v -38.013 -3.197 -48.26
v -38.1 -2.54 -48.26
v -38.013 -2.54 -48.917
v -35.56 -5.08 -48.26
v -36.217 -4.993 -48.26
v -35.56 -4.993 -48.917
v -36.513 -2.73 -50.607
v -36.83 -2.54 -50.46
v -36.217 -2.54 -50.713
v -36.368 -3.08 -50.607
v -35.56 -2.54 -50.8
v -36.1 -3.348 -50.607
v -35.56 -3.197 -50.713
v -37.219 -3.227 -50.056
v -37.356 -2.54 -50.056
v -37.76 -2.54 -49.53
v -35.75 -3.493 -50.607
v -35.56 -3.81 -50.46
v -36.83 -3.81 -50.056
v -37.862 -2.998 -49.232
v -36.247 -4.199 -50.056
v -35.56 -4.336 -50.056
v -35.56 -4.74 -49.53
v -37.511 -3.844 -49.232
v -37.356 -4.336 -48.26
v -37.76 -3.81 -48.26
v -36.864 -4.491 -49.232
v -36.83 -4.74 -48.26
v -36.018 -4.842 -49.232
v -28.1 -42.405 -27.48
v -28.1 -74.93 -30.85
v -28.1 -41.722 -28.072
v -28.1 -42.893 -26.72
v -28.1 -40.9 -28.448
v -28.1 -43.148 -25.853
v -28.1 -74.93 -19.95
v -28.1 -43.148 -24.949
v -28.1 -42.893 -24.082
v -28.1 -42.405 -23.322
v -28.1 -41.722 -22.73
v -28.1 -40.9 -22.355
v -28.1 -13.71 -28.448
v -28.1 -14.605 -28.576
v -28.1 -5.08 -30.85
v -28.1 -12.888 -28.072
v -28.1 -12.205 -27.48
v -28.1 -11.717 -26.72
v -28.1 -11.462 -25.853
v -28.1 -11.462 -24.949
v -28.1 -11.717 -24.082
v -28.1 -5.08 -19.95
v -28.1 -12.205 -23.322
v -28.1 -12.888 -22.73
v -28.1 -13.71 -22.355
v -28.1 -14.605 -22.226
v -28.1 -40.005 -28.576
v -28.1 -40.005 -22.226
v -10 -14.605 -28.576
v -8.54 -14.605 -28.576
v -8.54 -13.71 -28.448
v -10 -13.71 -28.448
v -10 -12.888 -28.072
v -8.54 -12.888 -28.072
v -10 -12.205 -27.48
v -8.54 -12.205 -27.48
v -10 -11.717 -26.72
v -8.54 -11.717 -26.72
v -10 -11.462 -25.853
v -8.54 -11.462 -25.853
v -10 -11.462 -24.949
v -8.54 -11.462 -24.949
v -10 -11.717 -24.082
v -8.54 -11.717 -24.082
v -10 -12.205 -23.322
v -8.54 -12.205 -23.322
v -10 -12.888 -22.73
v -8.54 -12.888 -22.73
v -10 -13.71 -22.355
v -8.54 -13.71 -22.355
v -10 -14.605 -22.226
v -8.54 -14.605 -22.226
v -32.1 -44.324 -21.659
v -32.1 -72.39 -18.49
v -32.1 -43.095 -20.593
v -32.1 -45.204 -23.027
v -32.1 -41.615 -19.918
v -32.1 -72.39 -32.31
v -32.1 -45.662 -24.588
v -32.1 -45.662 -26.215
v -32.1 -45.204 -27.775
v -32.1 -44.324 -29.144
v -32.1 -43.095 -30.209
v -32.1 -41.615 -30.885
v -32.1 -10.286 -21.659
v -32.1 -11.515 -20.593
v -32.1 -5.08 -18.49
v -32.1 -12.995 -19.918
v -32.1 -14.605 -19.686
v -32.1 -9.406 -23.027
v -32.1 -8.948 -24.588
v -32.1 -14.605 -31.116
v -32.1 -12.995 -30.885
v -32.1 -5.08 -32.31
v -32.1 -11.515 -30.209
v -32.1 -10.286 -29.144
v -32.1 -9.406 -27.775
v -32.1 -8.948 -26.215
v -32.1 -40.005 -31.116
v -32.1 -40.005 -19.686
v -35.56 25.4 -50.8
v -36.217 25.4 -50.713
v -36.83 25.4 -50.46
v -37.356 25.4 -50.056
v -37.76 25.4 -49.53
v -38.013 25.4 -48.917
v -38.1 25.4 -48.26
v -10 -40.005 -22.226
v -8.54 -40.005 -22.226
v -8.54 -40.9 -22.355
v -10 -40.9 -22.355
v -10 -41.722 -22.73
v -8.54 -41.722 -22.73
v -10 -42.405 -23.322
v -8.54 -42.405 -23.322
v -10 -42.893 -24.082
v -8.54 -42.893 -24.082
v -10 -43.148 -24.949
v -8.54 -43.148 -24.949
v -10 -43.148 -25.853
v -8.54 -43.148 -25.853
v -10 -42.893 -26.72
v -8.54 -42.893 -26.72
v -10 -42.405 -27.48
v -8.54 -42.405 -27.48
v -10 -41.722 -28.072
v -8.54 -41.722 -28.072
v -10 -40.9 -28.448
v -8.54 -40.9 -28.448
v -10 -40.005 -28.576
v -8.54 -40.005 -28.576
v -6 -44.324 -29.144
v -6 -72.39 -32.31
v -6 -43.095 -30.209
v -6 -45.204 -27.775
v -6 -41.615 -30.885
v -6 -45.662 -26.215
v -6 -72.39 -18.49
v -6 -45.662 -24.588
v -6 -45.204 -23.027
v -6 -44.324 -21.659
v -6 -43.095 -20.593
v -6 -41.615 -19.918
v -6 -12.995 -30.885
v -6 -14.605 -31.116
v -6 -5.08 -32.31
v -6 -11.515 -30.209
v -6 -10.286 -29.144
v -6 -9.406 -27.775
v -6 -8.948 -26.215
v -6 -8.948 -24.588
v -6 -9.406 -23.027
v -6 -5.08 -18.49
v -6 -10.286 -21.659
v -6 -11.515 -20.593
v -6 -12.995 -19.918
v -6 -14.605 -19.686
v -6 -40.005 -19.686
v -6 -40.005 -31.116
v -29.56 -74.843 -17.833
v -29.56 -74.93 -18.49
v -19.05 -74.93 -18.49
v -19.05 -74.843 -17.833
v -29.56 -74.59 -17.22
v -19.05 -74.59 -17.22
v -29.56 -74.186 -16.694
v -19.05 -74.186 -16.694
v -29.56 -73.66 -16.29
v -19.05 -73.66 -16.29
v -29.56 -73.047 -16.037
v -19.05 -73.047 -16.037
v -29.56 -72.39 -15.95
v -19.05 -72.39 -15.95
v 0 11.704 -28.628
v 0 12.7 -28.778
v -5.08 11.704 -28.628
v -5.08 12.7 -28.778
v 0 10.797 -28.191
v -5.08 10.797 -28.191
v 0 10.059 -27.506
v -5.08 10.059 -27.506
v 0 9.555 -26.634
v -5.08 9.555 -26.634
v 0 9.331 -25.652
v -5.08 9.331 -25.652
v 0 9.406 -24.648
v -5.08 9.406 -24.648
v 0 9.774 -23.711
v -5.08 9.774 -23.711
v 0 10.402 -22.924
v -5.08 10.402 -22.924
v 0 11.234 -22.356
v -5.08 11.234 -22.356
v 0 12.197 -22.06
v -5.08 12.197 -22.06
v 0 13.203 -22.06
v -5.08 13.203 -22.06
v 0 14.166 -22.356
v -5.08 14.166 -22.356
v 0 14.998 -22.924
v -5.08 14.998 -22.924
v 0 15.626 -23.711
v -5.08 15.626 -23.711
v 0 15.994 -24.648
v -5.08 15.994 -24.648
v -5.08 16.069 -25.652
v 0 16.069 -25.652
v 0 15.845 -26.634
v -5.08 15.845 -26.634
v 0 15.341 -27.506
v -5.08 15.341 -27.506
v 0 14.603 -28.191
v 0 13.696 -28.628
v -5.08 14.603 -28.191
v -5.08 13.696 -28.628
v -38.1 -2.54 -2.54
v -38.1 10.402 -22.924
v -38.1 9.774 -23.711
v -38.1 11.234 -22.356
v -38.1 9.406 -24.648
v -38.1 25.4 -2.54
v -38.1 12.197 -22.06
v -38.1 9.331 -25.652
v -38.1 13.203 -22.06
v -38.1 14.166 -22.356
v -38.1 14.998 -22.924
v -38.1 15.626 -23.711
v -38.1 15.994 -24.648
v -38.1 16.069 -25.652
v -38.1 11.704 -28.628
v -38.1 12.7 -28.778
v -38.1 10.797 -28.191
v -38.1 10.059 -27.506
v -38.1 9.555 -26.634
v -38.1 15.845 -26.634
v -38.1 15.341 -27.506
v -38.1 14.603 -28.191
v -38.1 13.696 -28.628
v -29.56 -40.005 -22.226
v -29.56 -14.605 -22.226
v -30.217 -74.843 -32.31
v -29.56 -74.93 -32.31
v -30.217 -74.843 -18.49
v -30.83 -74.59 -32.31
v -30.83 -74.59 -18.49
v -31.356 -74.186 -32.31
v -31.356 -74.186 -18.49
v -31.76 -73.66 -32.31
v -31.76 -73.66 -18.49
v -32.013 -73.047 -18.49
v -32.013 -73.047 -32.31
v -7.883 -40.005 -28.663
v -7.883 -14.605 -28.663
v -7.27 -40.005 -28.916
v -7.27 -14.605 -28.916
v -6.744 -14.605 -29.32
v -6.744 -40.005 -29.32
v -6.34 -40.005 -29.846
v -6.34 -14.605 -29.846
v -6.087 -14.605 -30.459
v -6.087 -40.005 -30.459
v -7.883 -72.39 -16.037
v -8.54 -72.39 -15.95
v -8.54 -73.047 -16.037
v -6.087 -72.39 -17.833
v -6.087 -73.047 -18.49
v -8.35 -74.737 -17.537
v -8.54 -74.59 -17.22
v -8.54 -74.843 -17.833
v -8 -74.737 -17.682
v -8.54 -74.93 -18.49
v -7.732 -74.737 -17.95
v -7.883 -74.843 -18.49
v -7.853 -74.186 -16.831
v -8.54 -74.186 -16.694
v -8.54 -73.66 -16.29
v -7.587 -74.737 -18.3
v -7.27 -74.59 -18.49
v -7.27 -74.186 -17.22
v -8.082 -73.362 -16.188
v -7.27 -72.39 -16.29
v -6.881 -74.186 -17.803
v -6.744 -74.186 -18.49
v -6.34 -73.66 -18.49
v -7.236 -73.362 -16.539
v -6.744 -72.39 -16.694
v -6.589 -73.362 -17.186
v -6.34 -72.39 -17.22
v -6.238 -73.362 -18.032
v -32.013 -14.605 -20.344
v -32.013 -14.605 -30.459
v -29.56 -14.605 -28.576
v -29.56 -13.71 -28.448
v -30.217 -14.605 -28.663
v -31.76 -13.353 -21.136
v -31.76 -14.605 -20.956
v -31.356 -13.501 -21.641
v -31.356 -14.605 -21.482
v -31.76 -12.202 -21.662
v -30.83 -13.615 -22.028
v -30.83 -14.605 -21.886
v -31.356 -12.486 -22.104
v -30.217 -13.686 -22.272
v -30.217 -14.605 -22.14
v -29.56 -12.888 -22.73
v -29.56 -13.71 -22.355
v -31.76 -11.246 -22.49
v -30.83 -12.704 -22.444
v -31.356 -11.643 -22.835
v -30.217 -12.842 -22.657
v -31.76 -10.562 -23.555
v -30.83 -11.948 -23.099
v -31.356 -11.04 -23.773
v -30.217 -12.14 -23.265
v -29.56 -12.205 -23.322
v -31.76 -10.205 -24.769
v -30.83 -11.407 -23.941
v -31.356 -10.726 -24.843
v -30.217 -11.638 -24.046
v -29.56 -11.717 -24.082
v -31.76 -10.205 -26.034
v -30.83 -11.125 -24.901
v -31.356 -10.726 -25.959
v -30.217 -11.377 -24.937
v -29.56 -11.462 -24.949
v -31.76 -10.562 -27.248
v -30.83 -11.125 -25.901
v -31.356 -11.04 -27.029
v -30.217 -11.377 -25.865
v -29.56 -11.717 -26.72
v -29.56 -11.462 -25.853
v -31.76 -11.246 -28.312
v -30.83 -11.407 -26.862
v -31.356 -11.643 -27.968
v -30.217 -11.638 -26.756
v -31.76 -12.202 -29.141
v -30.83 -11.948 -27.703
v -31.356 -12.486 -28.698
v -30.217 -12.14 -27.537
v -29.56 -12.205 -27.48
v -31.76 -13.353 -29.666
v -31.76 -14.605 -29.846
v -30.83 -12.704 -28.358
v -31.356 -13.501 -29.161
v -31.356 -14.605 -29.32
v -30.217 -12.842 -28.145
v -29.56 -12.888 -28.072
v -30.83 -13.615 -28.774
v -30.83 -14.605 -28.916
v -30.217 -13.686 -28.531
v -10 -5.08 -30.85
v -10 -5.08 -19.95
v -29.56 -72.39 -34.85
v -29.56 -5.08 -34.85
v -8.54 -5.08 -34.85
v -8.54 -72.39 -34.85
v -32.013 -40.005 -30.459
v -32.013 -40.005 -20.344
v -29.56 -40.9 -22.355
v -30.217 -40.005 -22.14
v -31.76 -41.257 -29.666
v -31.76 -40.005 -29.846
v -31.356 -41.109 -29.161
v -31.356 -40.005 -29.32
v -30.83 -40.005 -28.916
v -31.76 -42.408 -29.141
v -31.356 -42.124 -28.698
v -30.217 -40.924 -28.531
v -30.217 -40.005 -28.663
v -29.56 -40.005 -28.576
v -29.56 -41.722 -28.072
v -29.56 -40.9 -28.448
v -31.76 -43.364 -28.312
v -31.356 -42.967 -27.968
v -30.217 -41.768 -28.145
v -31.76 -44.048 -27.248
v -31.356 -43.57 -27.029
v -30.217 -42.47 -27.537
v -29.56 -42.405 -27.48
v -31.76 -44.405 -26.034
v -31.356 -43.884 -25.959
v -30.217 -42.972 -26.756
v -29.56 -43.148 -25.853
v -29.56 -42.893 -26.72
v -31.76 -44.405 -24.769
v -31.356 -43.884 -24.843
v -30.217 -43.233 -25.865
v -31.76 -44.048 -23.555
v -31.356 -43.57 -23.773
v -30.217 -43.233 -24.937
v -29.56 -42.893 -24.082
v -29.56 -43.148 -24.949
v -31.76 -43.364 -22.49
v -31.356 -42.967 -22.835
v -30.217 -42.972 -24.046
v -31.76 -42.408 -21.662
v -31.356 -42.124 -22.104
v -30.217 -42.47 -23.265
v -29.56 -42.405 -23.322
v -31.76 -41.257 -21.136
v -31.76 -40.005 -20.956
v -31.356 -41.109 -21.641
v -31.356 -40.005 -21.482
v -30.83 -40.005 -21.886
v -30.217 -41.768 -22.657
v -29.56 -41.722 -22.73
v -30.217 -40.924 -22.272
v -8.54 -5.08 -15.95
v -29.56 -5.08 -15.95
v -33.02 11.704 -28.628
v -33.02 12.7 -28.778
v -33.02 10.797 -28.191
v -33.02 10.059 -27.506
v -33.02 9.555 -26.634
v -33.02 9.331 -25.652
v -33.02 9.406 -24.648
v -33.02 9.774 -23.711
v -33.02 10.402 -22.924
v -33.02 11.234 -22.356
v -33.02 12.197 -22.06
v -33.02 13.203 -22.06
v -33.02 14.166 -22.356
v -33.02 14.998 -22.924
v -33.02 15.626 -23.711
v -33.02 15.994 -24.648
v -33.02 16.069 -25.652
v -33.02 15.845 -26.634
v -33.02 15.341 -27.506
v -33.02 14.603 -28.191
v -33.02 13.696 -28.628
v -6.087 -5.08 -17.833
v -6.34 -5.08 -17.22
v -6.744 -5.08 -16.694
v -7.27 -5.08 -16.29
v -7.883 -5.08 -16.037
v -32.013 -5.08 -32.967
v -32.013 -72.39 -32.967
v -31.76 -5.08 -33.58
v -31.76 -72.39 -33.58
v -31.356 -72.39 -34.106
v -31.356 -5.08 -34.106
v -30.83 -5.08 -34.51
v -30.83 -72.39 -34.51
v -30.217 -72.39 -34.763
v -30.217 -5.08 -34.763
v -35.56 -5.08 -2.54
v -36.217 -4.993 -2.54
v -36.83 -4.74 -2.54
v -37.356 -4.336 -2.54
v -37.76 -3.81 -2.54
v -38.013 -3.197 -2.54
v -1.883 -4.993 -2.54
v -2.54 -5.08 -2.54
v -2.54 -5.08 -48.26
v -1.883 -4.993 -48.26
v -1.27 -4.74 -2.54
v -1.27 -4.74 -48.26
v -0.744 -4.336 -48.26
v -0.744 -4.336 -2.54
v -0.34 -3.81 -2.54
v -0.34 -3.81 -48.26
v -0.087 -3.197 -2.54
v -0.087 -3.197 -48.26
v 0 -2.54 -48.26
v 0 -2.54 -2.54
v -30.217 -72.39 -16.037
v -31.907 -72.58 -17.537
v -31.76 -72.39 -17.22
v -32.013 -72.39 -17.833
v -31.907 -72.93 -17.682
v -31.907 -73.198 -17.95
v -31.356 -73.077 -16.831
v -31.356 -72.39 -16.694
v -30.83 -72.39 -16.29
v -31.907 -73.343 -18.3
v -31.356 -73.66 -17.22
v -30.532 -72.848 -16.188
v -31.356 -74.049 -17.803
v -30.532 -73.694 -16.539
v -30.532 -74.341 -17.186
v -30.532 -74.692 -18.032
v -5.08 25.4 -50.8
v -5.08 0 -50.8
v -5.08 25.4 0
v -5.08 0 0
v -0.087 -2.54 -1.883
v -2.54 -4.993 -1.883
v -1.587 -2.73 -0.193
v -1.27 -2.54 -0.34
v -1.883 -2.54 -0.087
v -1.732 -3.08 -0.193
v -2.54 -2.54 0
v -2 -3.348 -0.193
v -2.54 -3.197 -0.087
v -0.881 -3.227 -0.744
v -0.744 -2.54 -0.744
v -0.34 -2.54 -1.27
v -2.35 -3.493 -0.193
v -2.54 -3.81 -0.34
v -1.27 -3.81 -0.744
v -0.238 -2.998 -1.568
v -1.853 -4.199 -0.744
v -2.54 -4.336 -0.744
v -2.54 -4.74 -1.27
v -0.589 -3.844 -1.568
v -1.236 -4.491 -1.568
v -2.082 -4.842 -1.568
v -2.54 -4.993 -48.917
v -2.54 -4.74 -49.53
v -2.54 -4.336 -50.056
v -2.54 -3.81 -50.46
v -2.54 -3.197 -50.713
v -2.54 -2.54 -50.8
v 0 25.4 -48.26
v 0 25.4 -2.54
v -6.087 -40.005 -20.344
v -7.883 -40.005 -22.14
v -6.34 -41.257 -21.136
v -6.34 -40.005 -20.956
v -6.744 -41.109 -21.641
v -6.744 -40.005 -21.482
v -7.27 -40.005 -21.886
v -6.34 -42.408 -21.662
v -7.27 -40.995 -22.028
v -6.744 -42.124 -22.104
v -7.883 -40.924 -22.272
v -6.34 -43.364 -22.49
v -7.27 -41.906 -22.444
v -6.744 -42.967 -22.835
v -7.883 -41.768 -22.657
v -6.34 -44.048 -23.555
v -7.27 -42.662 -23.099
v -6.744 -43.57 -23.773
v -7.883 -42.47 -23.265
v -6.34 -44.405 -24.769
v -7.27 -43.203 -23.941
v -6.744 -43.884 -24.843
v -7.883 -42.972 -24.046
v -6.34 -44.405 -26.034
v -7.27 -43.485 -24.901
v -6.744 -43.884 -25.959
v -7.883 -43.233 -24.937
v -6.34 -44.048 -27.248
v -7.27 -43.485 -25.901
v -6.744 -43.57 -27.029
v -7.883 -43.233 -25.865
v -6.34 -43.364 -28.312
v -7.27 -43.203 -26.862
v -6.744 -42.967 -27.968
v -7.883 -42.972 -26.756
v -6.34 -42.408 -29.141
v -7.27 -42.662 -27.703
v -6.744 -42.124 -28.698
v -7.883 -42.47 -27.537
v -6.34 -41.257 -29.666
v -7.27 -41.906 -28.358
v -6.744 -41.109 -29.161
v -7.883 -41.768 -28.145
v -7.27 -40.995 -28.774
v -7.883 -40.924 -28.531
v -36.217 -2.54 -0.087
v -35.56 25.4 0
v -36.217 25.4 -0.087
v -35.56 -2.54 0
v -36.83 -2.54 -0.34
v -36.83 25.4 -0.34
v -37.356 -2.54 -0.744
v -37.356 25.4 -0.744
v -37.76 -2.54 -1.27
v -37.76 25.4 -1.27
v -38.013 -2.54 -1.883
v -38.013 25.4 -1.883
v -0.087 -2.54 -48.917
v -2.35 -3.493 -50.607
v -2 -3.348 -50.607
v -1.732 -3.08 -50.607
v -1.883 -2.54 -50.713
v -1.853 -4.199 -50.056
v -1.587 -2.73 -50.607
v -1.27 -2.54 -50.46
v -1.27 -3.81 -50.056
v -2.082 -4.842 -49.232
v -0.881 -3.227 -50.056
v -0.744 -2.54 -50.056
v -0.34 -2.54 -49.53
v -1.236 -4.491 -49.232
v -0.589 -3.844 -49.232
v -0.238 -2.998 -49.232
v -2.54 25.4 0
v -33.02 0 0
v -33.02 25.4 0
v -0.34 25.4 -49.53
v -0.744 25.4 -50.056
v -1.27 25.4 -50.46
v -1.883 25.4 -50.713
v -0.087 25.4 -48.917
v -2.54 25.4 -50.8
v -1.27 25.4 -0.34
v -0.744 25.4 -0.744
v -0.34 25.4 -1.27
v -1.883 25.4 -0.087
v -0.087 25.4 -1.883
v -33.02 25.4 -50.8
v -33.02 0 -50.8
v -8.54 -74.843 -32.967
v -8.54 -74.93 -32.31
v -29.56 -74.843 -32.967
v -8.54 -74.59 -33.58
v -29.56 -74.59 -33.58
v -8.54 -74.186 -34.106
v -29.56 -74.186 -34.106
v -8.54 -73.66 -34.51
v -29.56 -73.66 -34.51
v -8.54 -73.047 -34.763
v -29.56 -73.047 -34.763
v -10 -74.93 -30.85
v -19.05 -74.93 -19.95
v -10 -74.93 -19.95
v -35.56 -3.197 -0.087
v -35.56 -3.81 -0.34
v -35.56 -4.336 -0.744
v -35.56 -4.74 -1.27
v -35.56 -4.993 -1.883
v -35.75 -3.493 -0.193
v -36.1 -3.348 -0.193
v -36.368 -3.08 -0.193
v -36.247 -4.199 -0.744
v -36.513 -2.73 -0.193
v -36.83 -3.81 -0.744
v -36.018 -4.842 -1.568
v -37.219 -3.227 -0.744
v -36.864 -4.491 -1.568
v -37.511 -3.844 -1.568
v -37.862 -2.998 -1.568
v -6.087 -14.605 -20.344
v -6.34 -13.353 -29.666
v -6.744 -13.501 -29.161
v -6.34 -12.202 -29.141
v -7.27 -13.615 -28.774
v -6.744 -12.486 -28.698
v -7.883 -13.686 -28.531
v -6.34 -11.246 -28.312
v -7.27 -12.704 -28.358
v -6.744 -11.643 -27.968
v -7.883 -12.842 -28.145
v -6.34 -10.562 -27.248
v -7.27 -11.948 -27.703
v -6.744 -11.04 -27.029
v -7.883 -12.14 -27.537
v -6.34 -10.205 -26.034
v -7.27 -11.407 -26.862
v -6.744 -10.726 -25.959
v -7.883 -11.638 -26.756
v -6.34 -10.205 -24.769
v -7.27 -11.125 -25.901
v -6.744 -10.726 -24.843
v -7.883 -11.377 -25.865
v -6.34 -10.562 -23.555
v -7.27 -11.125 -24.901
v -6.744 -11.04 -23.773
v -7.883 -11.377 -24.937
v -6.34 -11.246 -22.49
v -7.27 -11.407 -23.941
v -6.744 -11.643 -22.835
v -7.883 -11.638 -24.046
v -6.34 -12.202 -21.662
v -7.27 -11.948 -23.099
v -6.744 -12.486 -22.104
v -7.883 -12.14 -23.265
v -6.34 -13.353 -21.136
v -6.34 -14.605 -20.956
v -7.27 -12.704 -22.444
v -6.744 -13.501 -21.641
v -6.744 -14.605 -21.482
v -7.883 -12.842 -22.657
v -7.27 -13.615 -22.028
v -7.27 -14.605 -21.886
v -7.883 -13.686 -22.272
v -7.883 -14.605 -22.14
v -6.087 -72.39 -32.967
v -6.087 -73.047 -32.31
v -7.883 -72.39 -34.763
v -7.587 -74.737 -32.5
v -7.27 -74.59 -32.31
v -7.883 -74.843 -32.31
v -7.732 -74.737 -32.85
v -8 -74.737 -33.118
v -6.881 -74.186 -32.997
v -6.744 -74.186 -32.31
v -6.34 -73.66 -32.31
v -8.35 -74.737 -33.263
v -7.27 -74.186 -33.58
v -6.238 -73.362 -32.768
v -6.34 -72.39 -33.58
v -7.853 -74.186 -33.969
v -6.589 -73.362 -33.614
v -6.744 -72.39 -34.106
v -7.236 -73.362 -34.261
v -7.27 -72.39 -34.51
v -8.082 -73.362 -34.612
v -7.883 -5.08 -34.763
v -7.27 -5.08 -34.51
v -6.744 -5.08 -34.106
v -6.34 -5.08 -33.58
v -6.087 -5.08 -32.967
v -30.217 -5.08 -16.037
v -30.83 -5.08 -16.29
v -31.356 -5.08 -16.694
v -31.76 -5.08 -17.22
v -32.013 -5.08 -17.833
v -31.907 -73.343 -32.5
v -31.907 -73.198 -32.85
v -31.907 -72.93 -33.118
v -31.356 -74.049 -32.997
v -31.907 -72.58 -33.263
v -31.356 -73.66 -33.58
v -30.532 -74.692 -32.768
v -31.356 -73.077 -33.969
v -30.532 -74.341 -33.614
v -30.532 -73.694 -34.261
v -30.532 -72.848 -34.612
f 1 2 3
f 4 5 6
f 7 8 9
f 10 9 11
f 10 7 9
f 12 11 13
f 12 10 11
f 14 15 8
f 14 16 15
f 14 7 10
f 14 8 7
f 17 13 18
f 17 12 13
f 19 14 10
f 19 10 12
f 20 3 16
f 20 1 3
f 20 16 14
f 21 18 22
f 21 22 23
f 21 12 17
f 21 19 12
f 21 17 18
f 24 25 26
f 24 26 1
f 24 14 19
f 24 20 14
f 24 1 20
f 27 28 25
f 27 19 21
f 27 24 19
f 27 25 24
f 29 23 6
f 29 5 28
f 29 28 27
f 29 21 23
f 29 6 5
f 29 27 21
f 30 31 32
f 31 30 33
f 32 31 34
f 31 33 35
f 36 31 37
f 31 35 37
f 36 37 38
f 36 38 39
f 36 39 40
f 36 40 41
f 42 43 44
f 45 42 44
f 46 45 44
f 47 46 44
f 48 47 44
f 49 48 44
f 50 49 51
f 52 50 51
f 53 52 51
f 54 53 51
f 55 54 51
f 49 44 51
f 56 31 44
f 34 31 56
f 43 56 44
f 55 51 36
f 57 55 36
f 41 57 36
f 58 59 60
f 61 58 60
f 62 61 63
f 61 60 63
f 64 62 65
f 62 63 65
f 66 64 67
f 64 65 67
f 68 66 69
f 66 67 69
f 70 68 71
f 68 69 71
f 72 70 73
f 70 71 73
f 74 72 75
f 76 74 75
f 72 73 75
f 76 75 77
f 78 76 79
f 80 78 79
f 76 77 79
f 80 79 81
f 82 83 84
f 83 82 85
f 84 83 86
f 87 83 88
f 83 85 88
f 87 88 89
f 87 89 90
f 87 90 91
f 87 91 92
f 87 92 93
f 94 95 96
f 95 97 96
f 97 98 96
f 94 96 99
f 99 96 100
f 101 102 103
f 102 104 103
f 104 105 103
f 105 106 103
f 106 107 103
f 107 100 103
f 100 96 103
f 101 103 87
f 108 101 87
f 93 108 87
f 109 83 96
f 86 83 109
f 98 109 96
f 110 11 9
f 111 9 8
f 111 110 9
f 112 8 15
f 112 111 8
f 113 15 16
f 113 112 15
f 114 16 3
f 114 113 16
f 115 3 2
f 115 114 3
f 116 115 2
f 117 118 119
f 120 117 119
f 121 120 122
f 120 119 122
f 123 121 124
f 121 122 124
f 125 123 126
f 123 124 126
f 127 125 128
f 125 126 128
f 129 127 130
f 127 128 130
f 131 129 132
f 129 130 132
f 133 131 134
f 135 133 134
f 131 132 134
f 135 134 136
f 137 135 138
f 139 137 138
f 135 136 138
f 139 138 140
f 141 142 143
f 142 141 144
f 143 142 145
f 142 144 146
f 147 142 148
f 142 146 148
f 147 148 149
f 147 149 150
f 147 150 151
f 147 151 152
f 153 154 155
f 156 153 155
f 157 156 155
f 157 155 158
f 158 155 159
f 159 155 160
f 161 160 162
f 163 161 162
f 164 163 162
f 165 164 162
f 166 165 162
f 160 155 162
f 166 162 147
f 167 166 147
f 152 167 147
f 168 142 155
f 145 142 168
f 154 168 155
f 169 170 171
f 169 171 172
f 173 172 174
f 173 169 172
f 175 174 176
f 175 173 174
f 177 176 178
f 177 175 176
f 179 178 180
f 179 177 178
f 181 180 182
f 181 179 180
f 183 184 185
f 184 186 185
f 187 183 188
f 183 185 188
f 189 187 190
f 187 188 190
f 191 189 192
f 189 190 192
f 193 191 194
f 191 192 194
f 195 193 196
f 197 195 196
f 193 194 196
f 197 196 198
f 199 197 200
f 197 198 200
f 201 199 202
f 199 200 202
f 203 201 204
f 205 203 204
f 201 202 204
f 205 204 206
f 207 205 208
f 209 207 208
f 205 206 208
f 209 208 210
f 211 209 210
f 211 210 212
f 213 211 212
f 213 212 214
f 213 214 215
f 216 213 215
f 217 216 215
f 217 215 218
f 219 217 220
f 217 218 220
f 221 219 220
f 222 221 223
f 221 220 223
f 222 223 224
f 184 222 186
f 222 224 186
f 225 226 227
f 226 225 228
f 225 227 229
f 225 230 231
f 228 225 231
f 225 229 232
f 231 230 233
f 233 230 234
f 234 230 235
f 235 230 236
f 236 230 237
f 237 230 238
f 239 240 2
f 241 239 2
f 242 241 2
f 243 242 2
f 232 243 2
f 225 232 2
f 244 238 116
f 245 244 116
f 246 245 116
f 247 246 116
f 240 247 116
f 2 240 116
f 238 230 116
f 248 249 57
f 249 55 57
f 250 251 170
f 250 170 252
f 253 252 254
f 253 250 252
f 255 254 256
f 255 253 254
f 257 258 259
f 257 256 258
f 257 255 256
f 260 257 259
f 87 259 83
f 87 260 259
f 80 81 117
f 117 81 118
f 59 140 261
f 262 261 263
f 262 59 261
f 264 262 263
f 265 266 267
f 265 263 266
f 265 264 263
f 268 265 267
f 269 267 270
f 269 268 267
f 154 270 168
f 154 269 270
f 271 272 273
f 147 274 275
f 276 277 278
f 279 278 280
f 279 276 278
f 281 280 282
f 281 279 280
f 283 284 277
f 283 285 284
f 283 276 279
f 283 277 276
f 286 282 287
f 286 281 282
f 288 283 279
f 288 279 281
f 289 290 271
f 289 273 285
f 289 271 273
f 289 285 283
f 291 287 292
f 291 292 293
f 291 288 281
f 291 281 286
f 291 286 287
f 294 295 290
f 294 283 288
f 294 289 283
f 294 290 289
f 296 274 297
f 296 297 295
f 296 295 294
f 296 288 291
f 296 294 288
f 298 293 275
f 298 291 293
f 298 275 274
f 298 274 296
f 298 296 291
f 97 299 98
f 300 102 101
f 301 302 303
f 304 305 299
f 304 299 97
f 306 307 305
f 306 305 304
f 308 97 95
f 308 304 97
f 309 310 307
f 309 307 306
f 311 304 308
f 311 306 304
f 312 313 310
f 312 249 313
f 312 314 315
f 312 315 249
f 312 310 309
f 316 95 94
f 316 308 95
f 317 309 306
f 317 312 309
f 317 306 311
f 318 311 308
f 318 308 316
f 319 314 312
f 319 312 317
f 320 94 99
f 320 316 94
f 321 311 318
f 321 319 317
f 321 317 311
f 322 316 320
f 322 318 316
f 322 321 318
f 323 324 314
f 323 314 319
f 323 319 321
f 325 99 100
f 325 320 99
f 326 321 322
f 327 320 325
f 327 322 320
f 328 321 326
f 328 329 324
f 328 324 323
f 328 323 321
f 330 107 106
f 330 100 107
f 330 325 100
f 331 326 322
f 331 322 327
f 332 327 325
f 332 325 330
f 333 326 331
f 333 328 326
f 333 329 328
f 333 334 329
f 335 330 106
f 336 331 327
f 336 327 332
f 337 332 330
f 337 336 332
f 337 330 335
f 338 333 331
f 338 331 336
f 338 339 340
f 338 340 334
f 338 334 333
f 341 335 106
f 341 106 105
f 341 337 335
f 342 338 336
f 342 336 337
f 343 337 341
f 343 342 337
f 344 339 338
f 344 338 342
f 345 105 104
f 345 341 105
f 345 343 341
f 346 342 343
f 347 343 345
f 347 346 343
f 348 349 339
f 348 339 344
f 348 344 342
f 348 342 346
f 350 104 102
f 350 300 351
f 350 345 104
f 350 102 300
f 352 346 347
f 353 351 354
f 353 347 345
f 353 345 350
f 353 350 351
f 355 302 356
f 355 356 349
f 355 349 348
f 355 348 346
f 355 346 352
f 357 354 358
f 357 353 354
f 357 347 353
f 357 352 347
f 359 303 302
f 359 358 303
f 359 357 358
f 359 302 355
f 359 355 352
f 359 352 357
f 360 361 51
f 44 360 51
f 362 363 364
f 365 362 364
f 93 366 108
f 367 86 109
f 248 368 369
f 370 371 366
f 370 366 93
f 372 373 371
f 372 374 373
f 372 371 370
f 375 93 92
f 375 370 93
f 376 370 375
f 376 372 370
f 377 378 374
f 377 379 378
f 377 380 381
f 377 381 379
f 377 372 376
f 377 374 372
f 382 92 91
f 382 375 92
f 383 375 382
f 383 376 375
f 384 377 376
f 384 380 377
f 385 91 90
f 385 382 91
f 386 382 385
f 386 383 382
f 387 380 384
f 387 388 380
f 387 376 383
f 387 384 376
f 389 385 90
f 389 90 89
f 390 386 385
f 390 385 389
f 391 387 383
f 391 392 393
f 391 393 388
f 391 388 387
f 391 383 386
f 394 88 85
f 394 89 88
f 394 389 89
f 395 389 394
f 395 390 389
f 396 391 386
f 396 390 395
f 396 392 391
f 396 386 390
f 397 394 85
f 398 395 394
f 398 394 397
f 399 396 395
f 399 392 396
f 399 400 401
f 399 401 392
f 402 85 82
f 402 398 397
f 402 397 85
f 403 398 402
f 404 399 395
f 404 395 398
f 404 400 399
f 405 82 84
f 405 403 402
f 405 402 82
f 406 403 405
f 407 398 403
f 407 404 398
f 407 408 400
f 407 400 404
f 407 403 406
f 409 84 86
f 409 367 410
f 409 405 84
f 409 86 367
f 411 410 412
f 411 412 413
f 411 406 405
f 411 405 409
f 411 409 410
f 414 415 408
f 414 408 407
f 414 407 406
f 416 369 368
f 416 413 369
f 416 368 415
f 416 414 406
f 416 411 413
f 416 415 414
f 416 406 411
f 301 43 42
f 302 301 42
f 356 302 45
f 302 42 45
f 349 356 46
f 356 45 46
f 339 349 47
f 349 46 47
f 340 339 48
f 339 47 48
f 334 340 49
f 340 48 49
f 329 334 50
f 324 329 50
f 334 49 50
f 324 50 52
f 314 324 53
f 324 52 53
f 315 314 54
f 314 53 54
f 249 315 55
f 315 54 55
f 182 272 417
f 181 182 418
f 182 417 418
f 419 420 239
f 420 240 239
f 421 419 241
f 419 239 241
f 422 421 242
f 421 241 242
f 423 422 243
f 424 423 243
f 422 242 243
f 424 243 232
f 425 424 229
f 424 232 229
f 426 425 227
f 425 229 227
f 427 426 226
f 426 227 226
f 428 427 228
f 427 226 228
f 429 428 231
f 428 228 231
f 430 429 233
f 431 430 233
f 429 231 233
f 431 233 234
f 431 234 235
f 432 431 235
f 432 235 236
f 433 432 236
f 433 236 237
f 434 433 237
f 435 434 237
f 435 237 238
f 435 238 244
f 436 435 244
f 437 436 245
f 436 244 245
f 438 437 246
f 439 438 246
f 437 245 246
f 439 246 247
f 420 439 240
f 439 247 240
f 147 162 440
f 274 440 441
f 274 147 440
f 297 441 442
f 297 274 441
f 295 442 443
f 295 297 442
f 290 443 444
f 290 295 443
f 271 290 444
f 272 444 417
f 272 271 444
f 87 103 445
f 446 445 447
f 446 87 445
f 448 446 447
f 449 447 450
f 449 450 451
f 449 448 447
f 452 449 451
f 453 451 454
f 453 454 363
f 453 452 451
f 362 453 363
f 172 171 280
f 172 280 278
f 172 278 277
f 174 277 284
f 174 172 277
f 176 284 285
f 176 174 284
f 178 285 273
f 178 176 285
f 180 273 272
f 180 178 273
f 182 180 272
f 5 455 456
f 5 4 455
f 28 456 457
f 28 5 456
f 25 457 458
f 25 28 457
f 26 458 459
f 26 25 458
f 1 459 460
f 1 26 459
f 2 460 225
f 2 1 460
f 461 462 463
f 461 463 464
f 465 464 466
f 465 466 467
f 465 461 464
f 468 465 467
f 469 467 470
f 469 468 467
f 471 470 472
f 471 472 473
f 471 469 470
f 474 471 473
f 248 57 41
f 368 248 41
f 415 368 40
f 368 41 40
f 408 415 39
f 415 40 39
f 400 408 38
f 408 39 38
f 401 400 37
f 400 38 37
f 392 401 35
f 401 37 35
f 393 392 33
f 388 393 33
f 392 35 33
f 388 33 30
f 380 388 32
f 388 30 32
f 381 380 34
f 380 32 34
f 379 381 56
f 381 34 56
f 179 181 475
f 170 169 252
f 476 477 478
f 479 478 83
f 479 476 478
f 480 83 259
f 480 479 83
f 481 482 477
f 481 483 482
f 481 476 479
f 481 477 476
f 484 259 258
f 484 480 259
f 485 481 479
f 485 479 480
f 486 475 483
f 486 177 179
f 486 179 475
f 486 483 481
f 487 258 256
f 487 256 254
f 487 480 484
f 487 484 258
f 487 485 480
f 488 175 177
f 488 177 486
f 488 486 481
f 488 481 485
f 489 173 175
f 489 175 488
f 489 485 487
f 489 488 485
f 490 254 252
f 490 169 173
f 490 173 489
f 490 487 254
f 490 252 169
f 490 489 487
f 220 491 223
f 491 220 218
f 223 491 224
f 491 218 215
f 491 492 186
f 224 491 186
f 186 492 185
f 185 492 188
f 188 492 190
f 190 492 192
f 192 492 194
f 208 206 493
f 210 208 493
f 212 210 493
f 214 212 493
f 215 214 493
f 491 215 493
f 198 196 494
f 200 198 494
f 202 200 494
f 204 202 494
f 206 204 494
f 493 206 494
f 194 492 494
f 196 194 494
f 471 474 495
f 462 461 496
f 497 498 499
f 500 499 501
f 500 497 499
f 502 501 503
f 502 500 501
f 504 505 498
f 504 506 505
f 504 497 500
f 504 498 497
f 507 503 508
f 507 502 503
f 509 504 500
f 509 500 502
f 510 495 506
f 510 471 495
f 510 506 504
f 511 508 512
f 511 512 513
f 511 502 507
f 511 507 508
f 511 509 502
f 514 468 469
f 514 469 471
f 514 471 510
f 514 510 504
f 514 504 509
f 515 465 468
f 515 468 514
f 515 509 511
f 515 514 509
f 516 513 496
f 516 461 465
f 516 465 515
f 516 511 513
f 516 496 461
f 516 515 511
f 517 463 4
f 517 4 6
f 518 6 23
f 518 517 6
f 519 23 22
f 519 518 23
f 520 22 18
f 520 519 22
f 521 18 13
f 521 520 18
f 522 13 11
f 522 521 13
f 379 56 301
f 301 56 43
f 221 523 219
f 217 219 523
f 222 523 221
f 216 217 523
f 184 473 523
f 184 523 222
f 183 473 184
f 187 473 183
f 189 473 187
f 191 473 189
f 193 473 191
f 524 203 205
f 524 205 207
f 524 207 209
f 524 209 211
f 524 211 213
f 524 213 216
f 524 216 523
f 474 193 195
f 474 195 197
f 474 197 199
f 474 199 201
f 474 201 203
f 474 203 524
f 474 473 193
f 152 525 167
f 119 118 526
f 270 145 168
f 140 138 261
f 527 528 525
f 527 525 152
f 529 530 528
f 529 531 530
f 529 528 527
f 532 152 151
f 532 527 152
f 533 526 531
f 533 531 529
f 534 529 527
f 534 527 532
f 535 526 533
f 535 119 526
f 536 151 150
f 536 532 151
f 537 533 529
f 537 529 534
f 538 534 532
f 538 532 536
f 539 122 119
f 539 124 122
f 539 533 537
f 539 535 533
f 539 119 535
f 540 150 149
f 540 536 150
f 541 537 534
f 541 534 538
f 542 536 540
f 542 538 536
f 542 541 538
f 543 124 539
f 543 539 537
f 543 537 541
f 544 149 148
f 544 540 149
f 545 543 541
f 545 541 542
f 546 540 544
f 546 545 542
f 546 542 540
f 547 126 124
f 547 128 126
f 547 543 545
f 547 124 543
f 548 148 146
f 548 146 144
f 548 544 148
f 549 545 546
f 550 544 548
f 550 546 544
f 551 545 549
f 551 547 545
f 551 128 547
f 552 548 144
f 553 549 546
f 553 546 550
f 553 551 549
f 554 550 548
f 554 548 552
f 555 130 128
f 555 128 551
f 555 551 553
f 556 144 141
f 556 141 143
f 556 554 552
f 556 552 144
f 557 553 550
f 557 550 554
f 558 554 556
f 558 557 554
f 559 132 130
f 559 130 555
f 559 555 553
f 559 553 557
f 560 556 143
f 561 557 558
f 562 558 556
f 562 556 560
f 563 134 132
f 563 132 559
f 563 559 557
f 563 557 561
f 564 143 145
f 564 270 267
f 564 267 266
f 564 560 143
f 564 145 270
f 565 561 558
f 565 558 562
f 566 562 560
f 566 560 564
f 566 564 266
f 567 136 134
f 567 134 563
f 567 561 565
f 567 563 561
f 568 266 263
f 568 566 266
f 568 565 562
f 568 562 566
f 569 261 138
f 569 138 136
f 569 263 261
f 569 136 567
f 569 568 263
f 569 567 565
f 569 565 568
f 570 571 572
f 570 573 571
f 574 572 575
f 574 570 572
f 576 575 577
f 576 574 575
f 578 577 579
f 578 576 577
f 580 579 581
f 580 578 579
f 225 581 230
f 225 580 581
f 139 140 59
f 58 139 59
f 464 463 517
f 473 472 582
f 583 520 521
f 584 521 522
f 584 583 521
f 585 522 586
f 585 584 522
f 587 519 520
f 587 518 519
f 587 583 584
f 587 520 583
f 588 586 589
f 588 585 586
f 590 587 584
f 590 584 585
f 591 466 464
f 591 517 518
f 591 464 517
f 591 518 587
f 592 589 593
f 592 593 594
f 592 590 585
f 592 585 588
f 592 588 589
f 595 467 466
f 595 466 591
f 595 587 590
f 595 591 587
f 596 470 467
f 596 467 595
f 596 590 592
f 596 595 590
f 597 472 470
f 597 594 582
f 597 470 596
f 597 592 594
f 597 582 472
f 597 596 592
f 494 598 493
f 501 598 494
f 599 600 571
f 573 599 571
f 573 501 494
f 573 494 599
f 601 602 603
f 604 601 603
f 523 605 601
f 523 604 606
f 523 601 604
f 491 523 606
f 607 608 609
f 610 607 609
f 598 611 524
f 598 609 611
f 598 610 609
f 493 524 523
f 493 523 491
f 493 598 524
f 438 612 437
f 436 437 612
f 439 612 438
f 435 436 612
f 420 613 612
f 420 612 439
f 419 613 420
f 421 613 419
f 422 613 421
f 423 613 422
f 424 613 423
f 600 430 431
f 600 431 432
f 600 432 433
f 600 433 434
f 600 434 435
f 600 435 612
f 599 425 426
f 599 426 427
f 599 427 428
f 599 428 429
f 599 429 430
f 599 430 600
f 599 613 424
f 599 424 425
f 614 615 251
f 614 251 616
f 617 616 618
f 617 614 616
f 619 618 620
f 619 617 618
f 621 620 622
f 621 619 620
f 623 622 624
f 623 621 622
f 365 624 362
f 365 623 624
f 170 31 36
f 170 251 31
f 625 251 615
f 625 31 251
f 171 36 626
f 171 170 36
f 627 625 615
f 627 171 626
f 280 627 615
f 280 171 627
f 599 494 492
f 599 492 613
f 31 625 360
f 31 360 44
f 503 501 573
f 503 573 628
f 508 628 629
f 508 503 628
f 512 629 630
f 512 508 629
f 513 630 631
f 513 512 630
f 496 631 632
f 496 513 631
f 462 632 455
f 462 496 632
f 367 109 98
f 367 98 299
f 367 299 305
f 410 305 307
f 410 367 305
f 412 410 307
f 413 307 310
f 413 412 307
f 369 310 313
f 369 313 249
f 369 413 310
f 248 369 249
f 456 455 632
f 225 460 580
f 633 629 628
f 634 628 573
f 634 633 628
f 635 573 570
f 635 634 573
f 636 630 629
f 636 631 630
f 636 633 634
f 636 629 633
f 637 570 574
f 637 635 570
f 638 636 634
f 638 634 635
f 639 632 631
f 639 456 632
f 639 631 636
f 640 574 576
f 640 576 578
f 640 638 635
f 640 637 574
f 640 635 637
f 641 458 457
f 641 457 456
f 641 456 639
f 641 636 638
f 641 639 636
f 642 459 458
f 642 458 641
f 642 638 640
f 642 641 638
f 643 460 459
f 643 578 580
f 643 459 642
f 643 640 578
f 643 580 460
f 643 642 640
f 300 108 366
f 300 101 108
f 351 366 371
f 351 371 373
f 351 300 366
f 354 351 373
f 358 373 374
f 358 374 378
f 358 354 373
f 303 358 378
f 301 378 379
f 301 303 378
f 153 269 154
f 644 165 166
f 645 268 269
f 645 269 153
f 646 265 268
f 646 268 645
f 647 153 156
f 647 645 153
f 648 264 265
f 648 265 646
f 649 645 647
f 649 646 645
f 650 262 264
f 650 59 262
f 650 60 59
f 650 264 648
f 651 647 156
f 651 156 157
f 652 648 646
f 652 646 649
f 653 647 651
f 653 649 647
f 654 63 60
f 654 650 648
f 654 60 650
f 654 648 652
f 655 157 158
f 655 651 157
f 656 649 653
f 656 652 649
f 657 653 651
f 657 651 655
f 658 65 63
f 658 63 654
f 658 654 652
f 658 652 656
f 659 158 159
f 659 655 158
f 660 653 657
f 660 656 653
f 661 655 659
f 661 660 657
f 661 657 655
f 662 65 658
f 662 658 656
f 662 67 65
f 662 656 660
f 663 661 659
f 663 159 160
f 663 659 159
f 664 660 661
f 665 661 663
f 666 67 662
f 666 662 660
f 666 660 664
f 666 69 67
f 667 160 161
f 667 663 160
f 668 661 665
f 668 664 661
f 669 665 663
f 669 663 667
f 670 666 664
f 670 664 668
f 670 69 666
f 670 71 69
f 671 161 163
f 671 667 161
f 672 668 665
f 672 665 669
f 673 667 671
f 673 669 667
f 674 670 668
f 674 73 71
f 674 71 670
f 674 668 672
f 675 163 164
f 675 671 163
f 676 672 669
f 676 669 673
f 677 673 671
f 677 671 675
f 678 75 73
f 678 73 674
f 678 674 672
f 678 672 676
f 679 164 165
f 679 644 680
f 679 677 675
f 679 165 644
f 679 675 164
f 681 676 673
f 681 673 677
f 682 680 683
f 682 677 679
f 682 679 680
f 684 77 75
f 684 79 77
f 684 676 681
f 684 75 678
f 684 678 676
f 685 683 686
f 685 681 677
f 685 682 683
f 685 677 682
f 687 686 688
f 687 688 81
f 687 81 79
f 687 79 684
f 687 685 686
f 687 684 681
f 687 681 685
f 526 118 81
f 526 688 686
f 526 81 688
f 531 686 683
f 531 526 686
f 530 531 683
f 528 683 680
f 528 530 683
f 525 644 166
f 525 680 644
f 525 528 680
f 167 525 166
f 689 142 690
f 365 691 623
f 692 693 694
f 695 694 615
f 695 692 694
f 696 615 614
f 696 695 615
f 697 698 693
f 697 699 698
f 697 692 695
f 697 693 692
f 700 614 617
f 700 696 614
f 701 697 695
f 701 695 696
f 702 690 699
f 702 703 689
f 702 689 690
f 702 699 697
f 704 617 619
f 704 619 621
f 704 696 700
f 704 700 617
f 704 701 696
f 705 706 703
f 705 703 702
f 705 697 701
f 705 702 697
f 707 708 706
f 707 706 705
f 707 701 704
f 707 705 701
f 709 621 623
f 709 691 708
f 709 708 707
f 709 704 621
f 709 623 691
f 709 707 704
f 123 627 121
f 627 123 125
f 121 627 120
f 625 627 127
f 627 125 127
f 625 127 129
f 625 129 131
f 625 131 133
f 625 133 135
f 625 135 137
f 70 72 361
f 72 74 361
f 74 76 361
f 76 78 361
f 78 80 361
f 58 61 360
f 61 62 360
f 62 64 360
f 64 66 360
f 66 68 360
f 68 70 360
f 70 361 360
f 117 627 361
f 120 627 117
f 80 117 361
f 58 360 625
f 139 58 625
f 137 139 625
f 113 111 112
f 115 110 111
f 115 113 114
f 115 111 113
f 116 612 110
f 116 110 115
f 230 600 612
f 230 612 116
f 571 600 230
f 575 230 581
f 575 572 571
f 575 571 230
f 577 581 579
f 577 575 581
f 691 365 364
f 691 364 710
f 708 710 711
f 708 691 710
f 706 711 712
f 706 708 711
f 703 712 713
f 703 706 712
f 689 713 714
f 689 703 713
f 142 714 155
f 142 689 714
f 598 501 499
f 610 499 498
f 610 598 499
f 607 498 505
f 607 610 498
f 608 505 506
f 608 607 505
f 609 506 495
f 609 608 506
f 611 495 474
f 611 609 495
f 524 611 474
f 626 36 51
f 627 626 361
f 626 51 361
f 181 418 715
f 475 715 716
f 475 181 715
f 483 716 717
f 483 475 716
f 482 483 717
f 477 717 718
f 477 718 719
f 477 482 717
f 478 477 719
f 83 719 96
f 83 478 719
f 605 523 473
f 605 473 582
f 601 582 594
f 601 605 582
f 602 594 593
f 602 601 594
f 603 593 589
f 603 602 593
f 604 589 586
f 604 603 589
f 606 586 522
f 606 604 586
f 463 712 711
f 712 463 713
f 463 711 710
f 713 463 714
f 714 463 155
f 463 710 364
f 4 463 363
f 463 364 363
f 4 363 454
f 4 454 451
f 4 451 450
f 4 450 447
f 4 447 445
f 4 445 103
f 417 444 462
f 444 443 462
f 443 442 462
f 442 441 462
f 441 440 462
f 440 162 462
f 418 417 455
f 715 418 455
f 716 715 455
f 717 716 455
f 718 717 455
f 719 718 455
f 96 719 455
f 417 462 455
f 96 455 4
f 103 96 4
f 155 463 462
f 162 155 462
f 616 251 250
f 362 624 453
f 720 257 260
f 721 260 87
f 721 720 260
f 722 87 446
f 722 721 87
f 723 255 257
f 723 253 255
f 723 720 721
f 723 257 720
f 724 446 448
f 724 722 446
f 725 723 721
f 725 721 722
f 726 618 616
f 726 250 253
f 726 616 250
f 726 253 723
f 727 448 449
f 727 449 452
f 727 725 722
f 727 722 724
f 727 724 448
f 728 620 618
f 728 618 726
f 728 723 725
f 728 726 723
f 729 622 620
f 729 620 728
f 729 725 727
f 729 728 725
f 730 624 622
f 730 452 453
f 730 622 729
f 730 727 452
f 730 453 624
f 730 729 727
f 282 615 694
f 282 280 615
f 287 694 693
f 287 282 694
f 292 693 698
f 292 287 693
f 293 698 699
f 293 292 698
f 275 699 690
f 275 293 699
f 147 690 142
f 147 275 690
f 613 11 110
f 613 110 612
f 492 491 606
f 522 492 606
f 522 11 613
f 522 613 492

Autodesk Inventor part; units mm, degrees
ref_plane "YZ Plane" through (0, 0, 0) normal (1, 0, 0) x (0, 1, 0)
ref_plane "XZ Plane" through (0, 0, 0) normal (0, 1, 0) x (-1, 0, 0)
ref_plane "XY Plane" through (0, 0, 0) normal (0, 0, 1) x (1, 0, 0)
sketch "Sketch1" plane through (0, 0, 0) normal (0, 1, 0) x (-1, 0, 0)
  line L0 (0, 0) -> (38.1, 0)
  line L1 (38.1, 0) -> (38.1, -50.8)
  line L2 (38.1, -50.8) -> (0, -50.8)
  line L3 (0, -50.8) -> (0, 0)
  line L4 (38.1, -50.8) -> (33.02, -50.8)
  line L5 (33.02, -50.8) -> (33.02, 0)
  line L6 (33.02, 0) -> (38.1, 0)
  line L7 (38.1, 0) -> (38.1, -50.8)
  line L8 (0, -50.8) -> (5.08, -50.8)
  line L9 (5.08, -50.8) -> (5.08, 0)
  line L10 (5.08, 0) -> (0, 0)
  line L11 (0, 0) -> (0, -50.8)
  dimension "d0" = 38.1
  dimension "d1" = 50.8
  dimension "d2" = 5.08
  dimension "d3" = 5.08
extrude "Extrusion1" add sketch "Sketch1" along normal blind 25.4 contours L0 L9 L2 L3 | L0 L1 L2 L5
extrude "Extrusion2" add sketch "Sketch1" against normal blind 5.08
sketch "Sketch2" plane through (0, 25.4, 0) normal (1, 0, 0) x (0, 0, -1)
  line L0 (50.8, 0) -> (0, 0) projected
  line L1 (25.4, 0) -> (25.4, -12.7)
  point P0 (0, -25.4)
  dimension "d8" = 12.7
hole "Hole1" at (0, 12.7, -25.4) direction (-1, 0, 0) diameter 6.7564 end through all clearance for "Socket Head Cap Screw" size "1/4" standard "Ansi Unified Screw Threads"
sketch "Sketch3" plane through (0, -5.08, 0) normal (0, -1, 0) x (1, 0, 0)
  line L0 (0, 0) -> (-19.05, 0)
  line L1 (0, 0) -> (-38.1, 0) projected
  line L2 (-19.05, 0) -> (-19.05, -25.4)
  line L3 (-6, -34.85) -> (-6, -15.95)
  line L4 (-6, -15.95) -> (-32.1, -15.95)
  line L5 (-32.1, -15.95) -> (-32.1, -34.85)
  line L6 (-32.1, -34.85) -> (-6, -34.85)
  line L7 (-6, -34.85) -> (-32.1, -15.95) construction
  line L8 (-6, -15.95) -> (-32.1, -34.85) construction
  line L9 (-10, -19.95) -> (-10, -30.85)
  line L10 (-10, -30.85) -> (-28.1, -30.85)
  line L11 (-28.1, -30.85) -> (-28.1, -19.95)
  line L12 (-28.1, -19.95) -> (-10, -19.95)
  line L13 (-10, -19.95) -> (-28.1, -30.85) construction
  line L14 (-10, -30.85) -> (-28.1, -19.95) construction
  dimension "d16" = 25.4
  dimension "d17" = 18.9
  dimension "d18" = 26.1
  dimension "d19" = 10.9
  dimension "d20" = 18.1
extrude "Extrusion3" add sketch "Sketch3" along normal blind 69.85
sketch "Sketch4" plane through (-6, -5.08, -15.95) normal (1, 0, 0) x (0, 0, -1)
  line L0 (18.9, 0) -> (18.9, -69.85) projected
  line L1 (18.9, -34.925) -> (9.4512, -34.925)
  line L2 (9.4512, -34.925) -> (9.4512, -9.525) construction
  line L3 (12.6262, -34.925) -> (12.6262, -9.525)
  line L4 (6.2762, -9.525) -> (6.2762, -34.925)
  arc A0 (6.2762, -34.925) -> (12.6262, -34.925) centre (9.4512, -34.925) ccw
  arc A1 (12.6262, -9.525) -> (6.2762, -9.525) centre (9.4512, -9.525) ccw
  point P0 (-15.95, 5.08)
  point P1 (9.4512, -22.225)
  dimension "d23" = 9.4488
  dimension "d24" = 25.4
  dimension "d25" = 6.35
extrude "Extrusion4" cut sketch "Sketch4" against normal blind 76.2
fillet "Fillet1" radius 2.54 24 edges at (-38.1, -5.08, -25.4) (0, -5.08, -25.4) (-6, -11.43, -25.4012) (-6, -27.305, -28.5762) (-6, -43.18, -25.4012) (-6, -27.305, -22.2262) (-6, -40.005, -15.95) (-6, -40.005, -34.85) (-6, -74.93, -25.4) (-19.05, -74.93, -15.95) (-19.05, -74.93, -34.85) (-32.1, -74.93, -25.4) (-32.1, -40.005, -15.95) (-32.1, -40.005, -34.85) (-32.1, -27.305, -28.5762) (-32.1, -11.43, -25.4012) (-32.1, -27.305, -22.2262) (-32.1, -43.18, -25.4012) (-19.05, -5.08, -50.8) (-38.1, 10.16, -50.8) (-38.1, 10.16, 0) (-19.05, -5.08, 0) (0, 10.16, -50.8) (0, 10.16, 0)
properties part number "Sample Holder end for 8020-neutron-whispervalve-r2"
